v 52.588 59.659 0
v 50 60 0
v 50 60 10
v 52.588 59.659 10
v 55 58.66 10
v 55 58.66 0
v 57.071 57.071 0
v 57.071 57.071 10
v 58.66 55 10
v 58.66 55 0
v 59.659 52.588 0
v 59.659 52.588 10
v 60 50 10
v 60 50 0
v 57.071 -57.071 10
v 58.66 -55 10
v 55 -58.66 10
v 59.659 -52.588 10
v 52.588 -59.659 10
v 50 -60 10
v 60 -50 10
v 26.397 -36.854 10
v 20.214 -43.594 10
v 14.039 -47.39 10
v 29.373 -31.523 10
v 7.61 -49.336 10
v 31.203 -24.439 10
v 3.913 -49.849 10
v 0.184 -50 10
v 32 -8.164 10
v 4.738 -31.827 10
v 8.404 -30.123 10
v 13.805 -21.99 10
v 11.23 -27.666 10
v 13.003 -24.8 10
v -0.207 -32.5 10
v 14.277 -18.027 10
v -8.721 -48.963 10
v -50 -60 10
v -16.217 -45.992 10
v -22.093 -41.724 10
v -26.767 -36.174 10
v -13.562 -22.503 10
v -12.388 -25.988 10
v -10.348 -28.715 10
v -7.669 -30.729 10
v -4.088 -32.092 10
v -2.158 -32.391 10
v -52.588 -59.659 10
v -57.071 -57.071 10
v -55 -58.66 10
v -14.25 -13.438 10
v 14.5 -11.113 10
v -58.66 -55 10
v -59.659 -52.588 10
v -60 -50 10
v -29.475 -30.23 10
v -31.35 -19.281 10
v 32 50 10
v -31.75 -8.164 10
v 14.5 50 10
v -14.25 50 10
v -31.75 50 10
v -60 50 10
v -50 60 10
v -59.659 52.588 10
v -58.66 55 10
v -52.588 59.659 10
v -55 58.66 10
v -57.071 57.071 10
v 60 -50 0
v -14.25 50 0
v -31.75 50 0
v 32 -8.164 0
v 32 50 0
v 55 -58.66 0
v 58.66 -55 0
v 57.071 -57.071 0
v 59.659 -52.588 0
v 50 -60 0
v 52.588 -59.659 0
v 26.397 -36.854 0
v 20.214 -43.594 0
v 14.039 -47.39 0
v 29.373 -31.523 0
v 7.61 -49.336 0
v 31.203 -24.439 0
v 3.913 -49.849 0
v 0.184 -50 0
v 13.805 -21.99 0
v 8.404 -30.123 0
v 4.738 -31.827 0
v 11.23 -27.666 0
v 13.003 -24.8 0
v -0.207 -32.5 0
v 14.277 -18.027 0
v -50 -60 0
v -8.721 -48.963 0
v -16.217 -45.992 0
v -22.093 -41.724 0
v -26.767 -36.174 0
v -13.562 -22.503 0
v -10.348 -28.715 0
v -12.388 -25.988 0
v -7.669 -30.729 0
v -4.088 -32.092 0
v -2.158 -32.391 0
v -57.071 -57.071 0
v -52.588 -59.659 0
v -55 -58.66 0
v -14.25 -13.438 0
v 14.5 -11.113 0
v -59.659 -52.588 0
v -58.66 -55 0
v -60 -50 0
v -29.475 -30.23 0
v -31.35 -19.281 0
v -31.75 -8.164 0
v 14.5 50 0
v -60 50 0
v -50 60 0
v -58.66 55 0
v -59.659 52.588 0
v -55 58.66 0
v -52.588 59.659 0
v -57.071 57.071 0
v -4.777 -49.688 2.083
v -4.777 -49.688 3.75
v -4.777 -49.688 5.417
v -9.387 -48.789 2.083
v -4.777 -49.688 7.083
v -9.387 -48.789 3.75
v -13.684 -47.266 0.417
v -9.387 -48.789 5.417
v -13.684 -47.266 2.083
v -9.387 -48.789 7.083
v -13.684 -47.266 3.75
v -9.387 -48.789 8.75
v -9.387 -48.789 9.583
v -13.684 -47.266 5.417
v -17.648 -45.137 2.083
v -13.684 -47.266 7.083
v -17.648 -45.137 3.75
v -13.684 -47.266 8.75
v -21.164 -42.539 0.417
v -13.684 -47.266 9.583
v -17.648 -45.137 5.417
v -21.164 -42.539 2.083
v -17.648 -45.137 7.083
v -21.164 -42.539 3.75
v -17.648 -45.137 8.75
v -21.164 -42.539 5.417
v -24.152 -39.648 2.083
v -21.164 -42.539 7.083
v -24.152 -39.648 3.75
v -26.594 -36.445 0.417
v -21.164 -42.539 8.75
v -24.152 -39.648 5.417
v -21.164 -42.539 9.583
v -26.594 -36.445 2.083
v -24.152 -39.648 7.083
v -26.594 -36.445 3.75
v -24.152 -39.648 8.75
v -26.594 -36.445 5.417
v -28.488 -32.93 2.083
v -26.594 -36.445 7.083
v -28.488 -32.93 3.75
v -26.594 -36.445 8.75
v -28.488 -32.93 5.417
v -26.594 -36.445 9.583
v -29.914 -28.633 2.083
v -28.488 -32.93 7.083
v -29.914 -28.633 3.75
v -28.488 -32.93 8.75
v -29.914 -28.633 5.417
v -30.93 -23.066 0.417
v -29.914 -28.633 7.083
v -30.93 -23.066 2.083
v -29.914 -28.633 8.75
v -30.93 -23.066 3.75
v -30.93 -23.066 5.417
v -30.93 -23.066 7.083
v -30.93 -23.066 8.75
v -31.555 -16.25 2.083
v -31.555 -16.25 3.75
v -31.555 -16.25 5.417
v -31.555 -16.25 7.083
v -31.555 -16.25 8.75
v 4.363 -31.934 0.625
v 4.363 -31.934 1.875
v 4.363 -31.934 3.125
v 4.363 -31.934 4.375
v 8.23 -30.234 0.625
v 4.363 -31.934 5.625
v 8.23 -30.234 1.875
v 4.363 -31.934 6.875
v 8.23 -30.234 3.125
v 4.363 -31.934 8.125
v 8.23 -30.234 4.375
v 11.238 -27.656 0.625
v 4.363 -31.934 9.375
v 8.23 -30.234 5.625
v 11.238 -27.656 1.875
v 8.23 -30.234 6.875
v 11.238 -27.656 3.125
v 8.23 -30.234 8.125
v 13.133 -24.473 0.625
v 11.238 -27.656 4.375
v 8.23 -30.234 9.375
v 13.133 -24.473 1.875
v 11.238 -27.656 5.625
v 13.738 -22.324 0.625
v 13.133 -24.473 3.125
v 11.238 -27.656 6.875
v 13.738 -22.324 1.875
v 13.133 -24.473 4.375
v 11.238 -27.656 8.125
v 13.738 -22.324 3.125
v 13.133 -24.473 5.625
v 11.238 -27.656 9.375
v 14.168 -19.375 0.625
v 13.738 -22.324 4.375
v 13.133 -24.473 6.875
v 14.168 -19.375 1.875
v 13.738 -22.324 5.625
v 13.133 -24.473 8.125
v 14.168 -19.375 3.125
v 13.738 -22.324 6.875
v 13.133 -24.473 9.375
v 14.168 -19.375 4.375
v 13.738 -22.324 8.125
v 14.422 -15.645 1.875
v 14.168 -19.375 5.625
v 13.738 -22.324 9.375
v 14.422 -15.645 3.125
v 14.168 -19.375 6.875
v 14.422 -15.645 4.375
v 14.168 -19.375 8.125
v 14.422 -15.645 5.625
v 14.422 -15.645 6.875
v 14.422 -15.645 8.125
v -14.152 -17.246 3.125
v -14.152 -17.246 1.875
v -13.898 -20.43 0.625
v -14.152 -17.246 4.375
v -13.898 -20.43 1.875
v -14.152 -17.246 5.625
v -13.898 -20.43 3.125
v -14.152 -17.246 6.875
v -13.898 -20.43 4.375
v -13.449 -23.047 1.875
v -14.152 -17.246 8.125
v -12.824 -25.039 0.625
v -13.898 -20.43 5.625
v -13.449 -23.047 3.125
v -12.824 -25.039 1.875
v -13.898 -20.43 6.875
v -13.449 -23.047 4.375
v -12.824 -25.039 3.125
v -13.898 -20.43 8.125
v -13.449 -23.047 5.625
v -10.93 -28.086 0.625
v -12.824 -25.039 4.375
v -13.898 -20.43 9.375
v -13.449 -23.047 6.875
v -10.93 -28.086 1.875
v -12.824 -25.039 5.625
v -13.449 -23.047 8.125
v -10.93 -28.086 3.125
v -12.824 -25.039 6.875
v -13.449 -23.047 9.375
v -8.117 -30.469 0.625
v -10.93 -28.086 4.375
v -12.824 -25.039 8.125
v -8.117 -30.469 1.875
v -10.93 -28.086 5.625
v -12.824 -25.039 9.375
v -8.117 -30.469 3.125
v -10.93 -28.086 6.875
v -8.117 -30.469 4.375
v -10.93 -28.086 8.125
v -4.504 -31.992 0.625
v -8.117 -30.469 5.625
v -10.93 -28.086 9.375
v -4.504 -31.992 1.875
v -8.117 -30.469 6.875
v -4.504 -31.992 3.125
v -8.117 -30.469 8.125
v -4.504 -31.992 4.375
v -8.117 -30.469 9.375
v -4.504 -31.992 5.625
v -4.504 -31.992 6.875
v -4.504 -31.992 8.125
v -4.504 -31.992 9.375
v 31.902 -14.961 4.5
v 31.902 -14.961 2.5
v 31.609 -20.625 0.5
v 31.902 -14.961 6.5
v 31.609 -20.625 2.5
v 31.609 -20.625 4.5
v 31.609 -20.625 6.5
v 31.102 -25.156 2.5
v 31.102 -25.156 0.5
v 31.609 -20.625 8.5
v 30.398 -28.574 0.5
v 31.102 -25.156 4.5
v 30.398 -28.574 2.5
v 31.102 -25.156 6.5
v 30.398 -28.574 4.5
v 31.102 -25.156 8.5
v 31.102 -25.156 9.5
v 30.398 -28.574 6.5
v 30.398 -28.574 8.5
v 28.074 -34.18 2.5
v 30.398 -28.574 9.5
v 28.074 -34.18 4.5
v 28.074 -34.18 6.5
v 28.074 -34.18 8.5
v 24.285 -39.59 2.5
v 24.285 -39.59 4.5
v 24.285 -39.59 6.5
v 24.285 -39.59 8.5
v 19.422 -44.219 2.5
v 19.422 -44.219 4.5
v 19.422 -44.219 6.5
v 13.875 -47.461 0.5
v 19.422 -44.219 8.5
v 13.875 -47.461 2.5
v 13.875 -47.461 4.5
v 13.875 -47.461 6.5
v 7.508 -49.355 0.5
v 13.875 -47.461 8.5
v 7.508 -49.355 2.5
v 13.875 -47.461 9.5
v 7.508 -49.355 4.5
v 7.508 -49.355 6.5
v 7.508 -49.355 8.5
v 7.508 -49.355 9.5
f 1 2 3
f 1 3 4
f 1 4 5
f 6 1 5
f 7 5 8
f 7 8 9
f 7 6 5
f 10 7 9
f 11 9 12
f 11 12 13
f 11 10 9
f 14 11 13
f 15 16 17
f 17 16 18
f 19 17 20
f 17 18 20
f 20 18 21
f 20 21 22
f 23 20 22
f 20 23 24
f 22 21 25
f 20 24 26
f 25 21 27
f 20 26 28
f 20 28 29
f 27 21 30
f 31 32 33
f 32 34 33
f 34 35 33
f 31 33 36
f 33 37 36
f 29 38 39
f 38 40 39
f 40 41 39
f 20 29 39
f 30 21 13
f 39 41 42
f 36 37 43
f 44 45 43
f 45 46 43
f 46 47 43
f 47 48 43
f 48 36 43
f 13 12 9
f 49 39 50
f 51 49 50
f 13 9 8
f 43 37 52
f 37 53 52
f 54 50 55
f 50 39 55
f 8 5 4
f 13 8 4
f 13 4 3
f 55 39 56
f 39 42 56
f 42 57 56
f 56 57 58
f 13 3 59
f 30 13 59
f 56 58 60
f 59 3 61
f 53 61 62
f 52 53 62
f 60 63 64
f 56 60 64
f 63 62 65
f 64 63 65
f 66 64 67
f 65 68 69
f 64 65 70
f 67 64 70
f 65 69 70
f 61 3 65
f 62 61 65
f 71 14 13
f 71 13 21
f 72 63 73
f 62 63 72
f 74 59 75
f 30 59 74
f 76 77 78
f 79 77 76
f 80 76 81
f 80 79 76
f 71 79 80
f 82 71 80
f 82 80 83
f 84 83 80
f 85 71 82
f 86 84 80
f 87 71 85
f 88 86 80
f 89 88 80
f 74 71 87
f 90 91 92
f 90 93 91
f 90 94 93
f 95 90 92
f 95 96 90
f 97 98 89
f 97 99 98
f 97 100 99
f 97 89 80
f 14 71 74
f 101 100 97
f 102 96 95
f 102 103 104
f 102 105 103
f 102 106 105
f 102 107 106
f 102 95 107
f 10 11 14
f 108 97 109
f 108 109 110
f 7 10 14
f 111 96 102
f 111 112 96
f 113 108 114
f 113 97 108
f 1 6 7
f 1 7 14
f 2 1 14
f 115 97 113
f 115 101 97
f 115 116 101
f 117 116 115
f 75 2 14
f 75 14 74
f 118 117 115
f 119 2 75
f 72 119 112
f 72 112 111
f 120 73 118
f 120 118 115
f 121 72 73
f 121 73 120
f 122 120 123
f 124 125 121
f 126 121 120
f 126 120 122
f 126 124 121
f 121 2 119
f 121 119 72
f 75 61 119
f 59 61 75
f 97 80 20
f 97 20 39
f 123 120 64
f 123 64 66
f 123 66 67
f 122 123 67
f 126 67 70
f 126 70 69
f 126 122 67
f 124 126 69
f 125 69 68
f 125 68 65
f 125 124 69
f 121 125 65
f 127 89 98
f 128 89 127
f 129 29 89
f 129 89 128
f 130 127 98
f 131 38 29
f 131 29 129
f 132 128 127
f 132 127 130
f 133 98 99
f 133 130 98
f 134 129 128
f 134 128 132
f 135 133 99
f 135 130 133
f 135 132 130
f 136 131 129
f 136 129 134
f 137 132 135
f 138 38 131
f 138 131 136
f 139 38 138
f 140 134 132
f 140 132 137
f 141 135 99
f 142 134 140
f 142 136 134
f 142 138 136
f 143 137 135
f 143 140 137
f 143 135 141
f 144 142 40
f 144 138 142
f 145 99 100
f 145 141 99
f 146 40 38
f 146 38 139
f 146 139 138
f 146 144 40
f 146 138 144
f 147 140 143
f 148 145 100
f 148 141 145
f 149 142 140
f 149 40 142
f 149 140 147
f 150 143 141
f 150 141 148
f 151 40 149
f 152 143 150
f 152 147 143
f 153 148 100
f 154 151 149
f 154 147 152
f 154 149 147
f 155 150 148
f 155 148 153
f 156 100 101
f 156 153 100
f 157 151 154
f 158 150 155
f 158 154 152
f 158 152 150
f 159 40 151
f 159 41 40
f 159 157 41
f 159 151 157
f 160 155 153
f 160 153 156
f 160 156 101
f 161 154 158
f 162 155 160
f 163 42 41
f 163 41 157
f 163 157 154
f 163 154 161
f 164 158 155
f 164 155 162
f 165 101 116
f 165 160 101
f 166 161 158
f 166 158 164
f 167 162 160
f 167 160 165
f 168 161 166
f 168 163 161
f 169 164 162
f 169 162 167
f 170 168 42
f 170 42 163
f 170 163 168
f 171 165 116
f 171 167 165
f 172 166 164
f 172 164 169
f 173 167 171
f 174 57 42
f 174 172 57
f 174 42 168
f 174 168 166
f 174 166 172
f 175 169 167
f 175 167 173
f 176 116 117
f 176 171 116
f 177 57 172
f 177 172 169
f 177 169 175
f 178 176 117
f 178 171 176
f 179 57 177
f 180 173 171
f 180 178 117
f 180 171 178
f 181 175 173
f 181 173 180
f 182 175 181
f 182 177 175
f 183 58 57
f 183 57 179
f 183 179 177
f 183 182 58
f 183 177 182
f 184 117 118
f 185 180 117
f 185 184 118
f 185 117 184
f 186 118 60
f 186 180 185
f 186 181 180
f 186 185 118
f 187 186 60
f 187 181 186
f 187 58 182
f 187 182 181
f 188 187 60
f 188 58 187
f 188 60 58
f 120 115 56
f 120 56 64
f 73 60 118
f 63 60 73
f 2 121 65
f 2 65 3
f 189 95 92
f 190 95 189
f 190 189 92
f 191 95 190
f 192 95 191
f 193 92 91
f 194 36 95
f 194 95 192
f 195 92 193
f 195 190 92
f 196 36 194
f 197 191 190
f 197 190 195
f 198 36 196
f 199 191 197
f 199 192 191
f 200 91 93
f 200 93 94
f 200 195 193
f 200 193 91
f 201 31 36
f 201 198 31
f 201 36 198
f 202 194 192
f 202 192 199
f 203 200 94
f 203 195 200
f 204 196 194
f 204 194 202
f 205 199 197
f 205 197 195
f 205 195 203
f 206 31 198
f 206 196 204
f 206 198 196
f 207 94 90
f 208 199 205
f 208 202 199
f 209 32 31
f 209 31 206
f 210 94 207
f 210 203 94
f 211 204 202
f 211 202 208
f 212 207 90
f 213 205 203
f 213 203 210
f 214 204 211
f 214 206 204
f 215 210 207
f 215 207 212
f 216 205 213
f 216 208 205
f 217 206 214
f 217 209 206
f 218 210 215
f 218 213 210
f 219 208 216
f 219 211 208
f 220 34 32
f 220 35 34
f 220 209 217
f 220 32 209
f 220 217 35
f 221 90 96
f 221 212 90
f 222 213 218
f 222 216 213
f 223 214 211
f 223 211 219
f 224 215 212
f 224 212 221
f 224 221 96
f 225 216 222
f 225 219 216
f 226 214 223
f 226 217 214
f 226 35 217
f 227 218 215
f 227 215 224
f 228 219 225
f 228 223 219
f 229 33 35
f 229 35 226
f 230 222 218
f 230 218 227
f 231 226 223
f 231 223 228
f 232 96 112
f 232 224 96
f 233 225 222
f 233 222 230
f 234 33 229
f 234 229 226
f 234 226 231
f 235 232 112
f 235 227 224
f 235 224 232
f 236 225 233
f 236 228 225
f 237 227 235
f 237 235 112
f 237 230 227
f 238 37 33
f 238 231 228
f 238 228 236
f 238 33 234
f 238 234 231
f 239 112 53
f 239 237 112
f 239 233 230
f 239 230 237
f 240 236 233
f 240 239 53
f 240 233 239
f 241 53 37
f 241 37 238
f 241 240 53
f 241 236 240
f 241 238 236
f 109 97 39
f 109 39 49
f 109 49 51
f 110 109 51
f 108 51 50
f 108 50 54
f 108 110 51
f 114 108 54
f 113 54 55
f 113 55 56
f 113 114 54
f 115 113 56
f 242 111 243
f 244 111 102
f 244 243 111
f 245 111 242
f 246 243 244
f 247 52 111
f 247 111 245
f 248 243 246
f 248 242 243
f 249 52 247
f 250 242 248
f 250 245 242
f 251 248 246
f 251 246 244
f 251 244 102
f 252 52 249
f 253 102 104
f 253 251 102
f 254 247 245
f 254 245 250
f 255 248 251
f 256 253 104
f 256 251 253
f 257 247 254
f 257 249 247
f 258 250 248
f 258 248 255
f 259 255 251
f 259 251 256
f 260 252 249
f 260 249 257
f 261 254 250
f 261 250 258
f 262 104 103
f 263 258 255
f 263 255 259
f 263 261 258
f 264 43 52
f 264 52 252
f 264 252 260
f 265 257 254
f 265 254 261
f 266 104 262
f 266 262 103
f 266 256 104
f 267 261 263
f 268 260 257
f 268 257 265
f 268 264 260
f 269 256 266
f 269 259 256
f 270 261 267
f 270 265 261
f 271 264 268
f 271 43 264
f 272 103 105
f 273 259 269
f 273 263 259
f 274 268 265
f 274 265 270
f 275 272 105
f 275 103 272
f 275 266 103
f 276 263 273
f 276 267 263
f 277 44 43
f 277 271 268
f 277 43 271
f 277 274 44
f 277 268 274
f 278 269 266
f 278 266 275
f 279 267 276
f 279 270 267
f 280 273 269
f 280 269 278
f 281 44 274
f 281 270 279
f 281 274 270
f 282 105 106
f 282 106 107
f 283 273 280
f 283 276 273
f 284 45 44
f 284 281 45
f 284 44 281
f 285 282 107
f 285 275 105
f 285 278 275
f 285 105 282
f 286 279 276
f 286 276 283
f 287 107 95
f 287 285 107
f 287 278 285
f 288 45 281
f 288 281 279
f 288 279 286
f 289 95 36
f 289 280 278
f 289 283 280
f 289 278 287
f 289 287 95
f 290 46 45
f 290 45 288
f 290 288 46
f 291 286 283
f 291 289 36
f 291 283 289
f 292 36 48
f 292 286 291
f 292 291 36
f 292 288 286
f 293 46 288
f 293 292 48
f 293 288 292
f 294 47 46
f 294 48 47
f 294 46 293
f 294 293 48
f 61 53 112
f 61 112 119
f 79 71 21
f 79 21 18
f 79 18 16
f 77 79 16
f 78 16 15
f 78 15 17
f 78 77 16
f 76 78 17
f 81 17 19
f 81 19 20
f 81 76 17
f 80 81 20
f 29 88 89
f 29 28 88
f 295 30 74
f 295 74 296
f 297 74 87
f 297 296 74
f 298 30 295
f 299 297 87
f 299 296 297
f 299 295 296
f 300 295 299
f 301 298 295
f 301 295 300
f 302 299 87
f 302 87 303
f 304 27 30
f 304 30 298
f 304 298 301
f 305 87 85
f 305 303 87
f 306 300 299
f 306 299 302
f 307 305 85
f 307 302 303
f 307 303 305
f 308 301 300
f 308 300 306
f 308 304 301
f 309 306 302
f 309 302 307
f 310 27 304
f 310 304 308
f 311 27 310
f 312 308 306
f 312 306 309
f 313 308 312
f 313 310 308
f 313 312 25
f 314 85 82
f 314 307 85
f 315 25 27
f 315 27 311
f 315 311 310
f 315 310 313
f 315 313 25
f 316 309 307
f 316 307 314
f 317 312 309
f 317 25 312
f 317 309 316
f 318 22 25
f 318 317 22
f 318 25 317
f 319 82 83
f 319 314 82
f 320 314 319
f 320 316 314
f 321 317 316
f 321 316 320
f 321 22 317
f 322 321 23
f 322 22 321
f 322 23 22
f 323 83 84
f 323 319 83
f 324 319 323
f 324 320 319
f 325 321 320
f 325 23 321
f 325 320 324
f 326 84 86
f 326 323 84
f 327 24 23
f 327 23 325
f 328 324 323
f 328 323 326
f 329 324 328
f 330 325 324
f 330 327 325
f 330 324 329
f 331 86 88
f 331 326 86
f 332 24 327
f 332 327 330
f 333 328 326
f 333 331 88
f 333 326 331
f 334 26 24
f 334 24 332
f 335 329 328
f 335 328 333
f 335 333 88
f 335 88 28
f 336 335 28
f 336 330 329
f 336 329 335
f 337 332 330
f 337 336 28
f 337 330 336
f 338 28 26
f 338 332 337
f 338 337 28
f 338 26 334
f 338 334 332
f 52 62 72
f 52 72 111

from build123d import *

# Parameters (mm, degrees)
BOSS_EXTRUDE1_DEPTH = 10
CUT_EXTRUDE34_DEPTH = 10


with BuildPart() as part:
    # Sketch1 → Boss-Extrude1 (new body)
    with BuildSketch(Plane.XY):
        with BuildLine():
            Line((-50, 60), (50, 60))
            ThreePointArc((50, 60), (57.071067812, 57.071067812), (60, 50))
            Line((60, 50), (60, -50))
            ThreePointArc((60, -50), (57.071067812, -57.071067812), (50, -60))
            Line((50, -60), (-50, -60))
            ThreePointArc((-50, -60), (-57.071067812, -57.071067812), (-60, -50))
            Line((-60, -50), (-60, 50))
            ThreePointArc((-60, 50), (-57.071067812, 57.071067812), (-50, 60))
        make_face()
    extrude(amount=BOSS_EXTRUDE1_DEPTH)

    # Sketch2 → Cut-Extrude34 (cut)
    with BuildSketch(Plane.XY.offset(10)):
        with BuildLine():
            Line((-31.75, 50), (-14.25, 50))
            Line((-14.25, 50), (-14.25, -13.4375))
            add(Edge.make_bspline(
                [(-14.25, -13.4375), (-14.249048436, -14.095192485), (-14.247210501, -15.365518725), (-14.155202495, -17.18802097), (-14.071008825, -18.863282124), (-13.919099547, -20.389468135), (-13.694677475, -21.767231851), (-13.477363681, -23.005423537), (-13.183250949, -24.081874769), (-12.741246534, -25.307158094), (-12.060262829, -26.683830835), (-10.947573238, -28.118630748), (-9.663624637, -29.428093921), (-8.124738289, -30.518041453), (-6.395166126, -31.399710765), (-4.484411381, -32.052930153), (-2.395167537, -32.416033402), (-0.950570024, -32.471467764), (-0.20703125, -32.5)],
                knots=[0, 0, 0, 0, 1.155499968, 2.231836252, 3.205919964, 4.102923608, 4.924856345, 5.658536265, 6.31071849, 6.882491295, 7.94666036, 8.992281882, 10.060072772, 11.158554251, 12.289267114, 13.461410017, 14.693379945, 16, 16, 16, 16], degree=3))
            add(Edge.make_bspline(
                [(-0.20703125, -32.5), (0.58288694, -32.476949616), (2.123093674, -32.432005269), (4.338435864, -31.990827854), (6.390962967, -31.288322317), (8.237215984, -30.285667879), (9.875357596, -29.083810814), (11.262010144, -27.713317134), (12.356351241, -26.171453388), (13.069602054, -24.748966669), (13.470057261, -23.439691518), (13.770218387, -22.269903853), (13.990269699, -20.8896702), (14.189907481, -19.320545885), (14.309874409, -17.5462778), (14.439958985, -15.58113484), (14.487636189, -13.411670971), (14.495762421, -11.901032563), (14.5, -11.11328125)],
                knots=[0, 0, 0, 0, 1.261321664, 2.459363699, 3.594844139, 4.716940403, 5.803436589, 6.833651888, 7.818396249, 8.814403945, 9.360733334, 10.004355033, 10.743453831, 11.592799886, 12.532235708, 13.585170094, 14.740740724, 16, 16, 16, 16], degree=3))
            Line((14.5, -11.11328125), (14.5, 50))
            Line((14.5, 50), (32, 50))
            Line((32, 50), (32, -8.1640625))
            add(Edge.make_bspline(
                [(32, -8.1640625), (31.997569807, -9.342463626), (31.992896783, -11.608414067), (31.921133218, -14.86474431), (31.768361569, -17.838879649), (31.640051007, -20.531689117), (31.391726127, -22.939545056), (31.133029856, -25.072729698), (30.803299203, -26.923683518), (30.312679818, -29.030769504), (29.466016005, -31.45700185), (28.101082939, -34.250703218), (26.368388756, -36.985906082), (24.320430824, -39.632521321), (22.008098987, -42.091141586), (19.48266259, -44.249491939), (16.78424454, -46.075223595), (13.884648303, -47.523695215), (10.786341582, -48.653393883), (7.458668947, -49.412494488), (3.903899606, -49.925352385), (1.448553234, -49.974618698), (0.18359375, -50)],
                knots=[0, 0, 0, 0, 1.170808336, 2.251350247, 3.235597562, 4.129743112, 4.929140599, 5.639994148, 6.264258765, 6.79612947, 7.788252245, 8.809469599, 9.879094798, 10.999557536, 12.129761673, 13.226370002, 14.293821979, 15.358369427, 16.438775801, 17.562147481, 18.744053101, 20, 20, 20, 20], degree=3))
            add(Edge.make_bspline(
                [(0.18359375, -50), (-0.656870496, -49.98584349), (-2.315089212, -49.957912986), (-4.753790735, -49.711638896), (-7.111274811, -49.34872349), (-9.383111744, -48.819267286), (-11.577186656, -48.13530876), (-13.692916631, -47.293403446), (-15.722439107, -46.298247386), (-17.65439716, -45.158993863), (-19.486413351, -43.927087294), (-21.160781583, -42.561467005), (-22.735120796, -41.163125773), (-24.163948989, -39.673215464), (-25.457997932, -38.107377594), (-26.614602531, -36.462063463), (-27.632044456, -34.737419211), (-28.535916899, -32.902358231), (-29.309543493, -30.863610995), (-29.961739774, -28.548658425), (-30.531513794, -25.921215951), (-30.954936225, -22.975364085), (-31.338813488, -19.720812027), (-31.581786631, -16.149081171), (-31.708896819, -12.260069041), (-31.735952739, -9.563897555), (-31.75, -8.1640625)],
                knots=[0, 0, 0, 0, 1.001158378, 1.975264943, 2.917723546, 3.841610987, 4.75185031, 5.653588123, 6.552117133, 7.442167995, 8.324307438, 9.179605724, 10.014504199, 10.831958861, 11.636465792, 12.43274043, 13.225645099, 14.020104002, 14.867201867, 15.819789774, 16.883317127, 18.068162734, 19.364263498, 20.787406516, 22.332041935, 24, 24, 24, 24], degree=3))
            Line((-31.75, -8.1640625), (-31.75, 50))
        make_face()
    extrude(amount=-CUT_EXTRUDE34_DEPTH, mode=Mode.SUBTRACT)


solid = part.part
